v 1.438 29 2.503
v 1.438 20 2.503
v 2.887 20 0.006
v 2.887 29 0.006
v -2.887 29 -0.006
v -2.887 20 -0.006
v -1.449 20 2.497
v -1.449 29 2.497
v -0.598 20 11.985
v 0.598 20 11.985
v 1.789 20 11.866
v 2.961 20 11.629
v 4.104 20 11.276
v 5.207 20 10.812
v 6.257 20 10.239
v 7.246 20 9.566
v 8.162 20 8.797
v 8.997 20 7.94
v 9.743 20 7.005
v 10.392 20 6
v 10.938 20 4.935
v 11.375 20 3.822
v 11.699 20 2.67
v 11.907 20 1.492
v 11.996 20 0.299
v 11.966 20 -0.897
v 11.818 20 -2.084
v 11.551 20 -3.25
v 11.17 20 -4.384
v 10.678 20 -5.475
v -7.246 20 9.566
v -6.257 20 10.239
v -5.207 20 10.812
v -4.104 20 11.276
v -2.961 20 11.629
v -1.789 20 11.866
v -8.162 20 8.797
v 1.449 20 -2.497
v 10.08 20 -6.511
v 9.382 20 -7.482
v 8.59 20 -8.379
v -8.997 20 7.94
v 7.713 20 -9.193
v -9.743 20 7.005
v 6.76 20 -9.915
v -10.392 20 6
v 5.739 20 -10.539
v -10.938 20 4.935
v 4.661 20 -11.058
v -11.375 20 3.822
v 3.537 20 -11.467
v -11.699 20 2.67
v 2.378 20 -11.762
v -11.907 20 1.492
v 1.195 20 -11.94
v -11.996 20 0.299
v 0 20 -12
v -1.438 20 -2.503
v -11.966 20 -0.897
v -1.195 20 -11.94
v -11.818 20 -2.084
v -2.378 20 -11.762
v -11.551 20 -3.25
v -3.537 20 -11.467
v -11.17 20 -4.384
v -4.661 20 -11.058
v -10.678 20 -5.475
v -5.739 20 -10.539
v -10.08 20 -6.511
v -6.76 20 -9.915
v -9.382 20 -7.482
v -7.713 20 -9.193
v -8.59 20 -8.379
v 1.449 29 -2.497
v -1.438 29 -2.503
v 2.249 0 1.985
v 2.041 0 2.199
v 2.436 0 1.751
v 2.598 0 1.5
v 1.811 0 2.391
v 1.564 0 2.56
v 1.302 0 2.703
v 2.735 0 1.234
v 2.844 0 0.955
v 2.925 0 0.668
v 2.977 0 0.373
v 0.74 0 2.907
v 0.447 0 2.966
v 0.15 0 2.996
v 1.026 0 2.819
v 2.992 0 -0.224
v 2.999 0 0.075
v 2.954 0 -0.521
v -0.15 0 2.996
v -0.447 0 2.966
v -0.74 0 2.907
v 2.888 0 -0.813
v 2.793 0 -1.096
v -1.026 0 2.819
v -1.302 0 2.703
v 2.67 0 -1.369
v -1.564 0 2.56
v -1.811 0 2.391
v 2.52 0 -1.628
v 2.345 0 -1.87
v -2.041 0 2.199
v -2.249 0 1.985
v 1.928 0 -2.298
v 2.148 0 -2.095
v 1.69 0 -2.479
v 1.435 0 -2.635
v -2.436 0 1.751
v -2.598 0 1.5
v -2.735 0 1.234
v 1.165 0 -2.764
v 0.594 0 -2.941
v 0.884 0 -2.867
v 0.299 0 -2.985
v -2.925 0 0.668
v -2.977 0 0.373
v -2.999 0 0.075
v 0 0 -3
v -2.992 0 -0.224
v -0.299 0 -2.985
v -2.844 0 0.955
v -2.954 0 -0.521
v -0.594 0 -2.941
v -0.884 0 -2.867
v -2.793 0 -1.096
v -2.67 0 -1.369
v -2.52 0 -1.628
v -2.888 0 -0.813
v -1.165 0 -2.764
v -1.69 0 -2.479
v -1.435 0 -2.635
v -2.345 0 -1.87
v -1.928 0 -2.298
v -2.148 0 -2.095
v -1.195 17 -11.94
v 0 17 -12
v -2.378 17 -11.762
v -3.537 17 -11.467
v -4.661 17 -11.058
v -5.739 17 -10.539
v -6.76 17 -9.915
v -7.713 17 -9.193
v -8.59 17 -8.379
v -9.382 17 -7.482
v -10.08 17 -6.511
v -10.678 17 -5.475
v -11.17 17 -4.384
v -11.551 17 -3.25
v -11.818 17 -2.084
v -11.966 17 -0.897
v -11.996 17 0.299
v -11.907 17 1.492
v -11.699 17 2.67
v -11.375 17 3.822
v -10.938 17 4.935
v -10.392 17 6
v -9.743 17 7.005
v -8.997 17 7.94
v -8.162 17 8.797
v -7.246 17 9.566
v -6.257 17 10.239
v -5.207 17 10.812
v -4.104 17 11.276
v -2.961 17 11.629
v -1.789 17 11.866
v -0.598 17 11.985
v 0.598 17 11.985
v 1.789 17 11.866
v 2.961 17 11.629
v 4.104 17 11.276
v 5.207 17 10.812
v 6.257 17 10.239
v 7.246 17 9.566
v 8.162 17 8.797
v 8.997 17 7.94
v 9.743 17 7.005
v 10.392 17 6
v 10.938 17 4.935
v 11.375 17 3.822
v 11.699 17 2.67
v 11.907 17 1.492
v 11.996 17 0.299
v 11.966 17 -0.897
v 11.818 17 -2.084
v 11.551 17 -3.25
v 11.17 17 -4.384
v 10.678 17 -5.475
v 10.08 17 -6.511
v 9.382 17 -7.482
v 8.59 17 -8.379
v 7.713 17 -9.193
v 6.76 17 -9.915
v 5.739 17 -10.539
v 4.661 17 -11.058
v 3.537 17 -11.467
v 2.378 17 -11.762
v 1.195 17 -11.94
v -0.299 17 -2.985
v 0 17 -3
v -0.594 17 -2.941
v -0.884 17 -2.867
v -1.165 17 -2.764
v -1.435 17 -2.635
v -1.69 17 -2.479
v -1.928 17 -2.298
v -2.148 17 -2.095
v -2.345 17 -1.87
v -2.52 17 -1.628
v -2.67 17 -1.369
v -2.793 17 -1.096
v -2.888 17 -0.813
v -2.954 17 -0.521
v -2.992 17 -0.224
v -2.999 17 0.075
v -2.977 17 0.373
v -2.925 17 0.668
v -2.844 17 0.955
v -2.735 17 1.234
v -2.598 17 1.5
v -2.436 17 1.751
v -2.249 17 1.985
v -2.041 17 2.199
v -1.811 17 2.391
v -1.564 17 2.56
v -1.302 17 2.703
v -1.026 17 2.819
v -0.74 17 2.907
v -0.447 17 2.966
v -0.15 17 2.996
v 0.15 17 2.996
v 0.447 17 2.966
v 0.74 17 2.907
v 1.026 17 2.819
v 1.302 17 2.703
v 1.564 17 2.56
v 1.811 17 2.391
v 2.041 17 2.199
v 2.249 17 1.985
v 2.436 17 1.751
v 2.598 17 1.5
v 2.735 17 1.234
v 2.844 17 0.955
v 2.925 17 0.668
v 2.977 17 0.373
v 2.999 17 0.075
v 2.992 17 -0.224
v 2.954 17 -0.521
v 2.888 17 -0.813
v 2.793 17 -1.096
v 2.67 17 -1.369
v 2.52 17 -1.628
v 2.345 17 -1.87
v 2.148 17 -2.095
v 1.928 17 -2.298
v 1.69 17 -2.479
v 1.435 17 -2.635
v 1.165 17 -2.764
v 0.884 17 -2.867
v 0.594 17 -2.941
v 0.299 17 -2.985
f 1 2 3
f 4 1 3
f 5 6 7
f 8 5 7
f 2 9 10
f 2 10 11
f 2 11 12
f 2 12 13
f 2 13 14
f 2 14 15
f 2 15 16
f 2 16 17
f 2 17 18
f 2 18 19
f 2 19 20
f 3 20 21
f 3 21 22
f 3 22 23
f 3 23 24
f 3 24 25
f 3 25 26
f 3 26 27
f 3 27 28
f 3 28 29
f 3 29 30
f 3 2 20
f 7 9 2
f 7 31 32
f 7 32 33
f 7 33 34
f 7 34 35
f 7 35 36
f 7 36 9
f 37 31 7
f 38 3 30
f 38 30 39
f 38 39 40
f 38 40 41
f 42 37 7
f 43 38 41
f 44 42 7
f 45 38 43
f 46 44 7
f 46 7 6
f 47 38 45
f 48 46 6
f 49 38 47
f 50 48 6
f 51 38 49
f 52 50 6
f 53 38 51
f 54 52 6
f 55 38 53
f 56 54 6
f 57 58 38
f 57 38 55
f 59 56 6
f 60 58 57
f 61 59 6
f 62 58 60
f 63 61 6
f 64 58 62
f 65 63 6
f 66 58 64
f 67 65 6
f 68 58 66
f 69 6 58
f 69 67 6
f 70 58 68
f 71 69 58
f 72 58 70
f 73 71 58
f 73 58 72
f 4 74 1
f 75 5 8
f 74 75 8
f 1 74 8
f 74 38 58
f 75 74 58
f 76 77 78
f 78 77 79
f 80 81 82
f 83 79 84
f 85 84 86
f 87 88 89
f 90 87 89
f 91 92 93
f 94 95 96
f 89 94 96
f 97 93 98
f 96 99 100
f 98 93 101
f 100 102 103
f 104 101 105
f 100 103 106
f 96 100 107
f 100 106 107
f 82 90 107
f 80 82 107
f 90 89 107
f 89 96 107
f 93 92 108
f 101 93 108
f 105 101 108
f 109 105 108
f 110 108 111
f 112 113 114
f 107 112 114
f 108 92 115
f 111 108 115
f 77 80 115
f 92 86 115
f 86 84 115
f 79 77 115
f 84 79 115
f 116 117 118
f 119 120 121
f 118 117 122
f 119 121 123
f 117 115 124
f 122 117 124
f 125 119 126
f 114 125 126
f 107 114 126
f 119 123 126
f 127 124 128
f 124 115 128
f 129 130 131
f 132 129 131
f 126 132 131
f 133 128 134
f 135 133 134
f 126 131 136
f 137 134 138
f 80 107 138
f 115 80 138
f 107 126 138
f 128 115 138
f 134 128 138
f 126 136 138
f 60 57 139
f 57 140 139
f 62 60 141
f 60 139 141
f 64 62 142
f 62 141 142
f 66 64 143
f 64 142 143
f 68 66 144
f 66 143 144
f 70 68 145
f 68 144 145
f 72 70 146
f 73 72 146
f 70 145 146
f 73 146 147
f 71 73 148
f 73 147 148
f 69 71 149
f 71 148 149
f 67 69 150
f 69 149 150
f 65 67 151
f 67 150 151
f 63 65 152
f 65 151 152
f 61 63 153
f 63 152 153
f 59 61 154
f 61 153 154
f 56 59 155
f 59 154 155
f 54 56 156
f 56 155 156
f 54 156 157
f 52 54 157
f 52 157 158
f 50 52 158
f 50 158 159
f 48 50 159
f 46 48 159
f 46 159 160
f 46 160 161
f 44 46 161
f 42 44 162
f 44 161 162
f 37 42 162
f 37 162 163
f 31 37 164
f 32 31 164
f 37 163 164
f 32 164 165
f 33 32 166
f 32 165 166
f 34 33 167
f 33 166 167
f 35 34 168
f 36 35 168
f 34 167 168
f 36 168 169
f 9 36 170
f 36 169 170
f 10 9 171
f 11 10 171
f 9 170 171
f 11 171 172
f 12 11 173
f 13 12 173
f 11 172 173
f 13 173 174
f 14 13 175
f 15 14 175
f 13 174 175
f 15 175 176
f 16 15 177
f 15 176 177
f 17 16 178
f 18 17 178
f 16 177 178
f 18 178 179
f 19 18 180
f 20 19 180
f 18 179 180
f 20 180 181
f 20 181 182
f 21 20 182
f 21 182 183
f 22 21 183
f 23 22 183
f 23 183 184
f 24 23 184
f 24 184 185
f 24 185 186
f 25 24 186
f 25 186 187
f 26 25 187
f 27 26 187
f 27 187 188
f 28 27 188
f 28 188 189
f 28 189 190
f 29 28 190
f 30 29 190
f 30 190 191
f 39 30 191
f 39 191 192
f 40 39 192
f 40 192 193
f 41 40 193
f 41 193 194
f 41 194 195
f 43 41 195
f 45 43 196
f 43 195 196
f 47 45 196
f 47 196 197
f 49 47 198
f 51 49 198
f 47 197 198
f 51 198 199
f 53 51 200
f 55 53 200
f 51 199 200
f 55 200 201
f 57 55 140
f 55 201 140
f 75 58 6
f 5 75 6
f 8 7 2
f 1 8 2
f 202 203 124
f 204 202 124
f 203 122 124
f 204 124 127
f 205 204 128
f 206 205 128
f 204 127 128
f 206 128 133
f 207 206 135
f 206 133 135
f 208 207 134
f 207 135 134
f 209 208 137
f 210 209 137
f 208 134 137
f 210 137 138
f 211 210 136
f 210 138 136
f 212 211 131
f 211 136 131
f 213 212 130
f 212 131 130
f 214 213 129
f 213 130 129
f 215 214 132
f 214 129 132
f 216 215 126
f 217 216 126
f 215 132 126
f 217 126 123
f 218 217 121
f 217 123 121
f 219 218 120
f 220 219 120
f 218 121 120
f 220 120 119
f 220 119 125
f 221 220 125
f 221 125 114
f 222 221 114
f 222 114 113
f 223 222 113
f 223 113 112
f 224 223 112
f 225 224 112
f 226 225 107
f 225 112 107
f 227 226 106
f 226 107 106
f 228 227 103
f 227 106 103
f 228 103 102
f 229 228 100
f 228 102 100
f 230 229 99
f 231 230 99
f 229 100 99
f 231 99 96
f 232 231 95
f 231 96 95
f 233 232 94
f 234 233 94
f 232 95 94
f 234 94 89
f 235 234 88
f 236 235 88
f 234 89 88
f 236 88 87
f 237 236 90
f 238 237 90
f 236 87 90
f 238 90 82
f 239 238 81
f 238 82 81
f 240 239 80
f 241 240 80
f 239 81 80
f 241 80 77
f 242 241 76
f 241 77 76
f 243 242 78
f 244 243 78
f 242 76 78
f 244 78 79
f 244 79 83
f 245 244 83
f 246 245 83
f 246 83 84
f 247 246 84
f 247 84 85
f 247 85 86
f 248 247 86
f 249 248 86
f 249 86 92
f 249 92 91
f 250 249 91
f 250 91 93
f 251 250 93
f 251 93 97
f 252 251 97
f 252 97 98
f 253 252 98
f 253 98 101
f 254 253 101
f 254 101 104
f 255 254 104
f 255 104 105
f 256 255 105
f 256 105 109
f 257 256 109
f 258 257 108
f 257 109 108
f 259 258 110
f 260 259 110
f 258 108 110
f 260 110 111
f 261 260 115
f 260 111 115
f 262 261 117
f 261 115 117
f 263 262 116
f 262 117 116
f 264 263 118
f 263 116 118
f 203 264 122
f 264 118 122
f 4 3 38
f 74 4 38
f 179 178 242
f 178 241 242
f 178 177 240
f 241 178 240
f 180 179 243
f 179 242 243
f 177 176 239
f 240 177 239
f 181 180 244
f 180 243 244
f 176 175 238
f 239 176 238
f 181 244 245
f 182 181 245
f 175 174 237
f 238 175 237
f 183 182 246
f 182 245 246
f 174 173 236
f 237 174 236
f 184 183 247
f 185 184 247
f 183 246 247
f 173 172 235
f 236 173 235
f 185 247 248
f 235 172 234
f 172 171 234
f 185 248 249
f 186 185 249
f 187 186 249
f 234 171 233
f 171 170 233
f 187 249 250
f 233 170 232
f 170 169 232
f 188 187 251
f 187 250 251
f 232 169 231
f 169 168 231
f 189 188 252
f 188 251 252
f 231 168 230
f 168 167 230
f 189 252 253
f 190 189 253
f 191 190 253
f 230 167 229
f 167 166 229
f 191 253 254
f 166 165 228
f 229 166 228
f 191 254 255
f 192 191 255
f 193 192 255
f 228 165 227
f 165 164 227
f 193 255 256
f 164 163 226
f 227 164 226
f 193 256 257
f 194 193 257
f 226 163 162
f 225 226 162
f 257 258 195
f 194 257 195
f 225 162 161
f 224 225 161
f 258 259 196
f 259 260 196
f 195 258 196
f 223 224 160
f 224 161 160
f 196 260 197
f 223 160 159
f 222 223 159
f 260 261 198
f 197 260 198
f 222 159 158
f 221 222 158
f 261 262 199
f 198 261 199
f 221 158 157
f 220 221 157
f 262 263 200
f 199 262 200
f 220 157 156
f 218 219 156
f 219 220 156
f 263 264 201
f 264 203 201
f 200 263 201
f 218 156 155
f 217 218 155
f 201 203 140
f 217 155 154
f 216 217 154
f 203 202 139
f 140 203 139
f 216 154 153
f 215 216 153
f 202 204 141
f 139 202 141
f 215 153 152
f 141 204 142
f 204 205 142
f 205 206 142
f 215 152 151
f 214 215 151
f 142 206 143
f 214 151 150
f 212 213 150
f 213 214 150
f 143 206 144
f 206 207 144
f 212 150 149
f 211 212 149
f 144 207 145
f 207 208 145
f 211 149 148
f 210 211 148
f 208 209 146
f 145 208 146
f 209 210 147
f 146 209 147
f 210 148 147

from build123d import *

# Parameters (mm, degrees)
CUT_EXTRUDE_START   = -9
SKETCH_2_R          = 3
CUT_EXTRUDE_2_DEPTH = 9


with BuildPart() as part:
    # ｽｹｯﾁ1 → 回転1 (revolve)
    with BuildSketch(Plane.XY, mode=Mode.PRIVATE) as revolve_1_sk:
        Polygon((0, 0), (0, 29), (3, 29), (3, 20), (12, 20), (12, 17), (3, 17), (3, 0), align=None)
    revolve(revolve_1_sk.sketch.rotate(Axis((0, 0, 0), (0, 1, 0)), 90), axis=Axis((0, 0, 0), (0, 1, 0)))

    # ｽｹｯﾁ2 → ｶｯﾄ - 押し出し2 (cut)
    with BuildSketch(Plane(origin=(0, 29, 0), x_dir=(1, 0, 0), z_dir=(0, 1, 0)).offset(CUT_EXTRUDE_START)):
        with Locations(Location((0, 0, 0), (0, 0, 90))):
            Circle(SKETCH_2_R)
        Polygon((1.437961457, -2.503118092), (2.886744585, -0.006247894), (1.448783128, 2.496870197), (-1.437961457, 2.503118092), (-2.886744585, 0.006247894), (-1.448783128, -2.496870197), align=None, mode=Mode.SUBTRACT)
    extrude(amount=CUT_EXTRUDE_2_DEPTH, mode=Mode.SUBTRACT)


solid = part.part
